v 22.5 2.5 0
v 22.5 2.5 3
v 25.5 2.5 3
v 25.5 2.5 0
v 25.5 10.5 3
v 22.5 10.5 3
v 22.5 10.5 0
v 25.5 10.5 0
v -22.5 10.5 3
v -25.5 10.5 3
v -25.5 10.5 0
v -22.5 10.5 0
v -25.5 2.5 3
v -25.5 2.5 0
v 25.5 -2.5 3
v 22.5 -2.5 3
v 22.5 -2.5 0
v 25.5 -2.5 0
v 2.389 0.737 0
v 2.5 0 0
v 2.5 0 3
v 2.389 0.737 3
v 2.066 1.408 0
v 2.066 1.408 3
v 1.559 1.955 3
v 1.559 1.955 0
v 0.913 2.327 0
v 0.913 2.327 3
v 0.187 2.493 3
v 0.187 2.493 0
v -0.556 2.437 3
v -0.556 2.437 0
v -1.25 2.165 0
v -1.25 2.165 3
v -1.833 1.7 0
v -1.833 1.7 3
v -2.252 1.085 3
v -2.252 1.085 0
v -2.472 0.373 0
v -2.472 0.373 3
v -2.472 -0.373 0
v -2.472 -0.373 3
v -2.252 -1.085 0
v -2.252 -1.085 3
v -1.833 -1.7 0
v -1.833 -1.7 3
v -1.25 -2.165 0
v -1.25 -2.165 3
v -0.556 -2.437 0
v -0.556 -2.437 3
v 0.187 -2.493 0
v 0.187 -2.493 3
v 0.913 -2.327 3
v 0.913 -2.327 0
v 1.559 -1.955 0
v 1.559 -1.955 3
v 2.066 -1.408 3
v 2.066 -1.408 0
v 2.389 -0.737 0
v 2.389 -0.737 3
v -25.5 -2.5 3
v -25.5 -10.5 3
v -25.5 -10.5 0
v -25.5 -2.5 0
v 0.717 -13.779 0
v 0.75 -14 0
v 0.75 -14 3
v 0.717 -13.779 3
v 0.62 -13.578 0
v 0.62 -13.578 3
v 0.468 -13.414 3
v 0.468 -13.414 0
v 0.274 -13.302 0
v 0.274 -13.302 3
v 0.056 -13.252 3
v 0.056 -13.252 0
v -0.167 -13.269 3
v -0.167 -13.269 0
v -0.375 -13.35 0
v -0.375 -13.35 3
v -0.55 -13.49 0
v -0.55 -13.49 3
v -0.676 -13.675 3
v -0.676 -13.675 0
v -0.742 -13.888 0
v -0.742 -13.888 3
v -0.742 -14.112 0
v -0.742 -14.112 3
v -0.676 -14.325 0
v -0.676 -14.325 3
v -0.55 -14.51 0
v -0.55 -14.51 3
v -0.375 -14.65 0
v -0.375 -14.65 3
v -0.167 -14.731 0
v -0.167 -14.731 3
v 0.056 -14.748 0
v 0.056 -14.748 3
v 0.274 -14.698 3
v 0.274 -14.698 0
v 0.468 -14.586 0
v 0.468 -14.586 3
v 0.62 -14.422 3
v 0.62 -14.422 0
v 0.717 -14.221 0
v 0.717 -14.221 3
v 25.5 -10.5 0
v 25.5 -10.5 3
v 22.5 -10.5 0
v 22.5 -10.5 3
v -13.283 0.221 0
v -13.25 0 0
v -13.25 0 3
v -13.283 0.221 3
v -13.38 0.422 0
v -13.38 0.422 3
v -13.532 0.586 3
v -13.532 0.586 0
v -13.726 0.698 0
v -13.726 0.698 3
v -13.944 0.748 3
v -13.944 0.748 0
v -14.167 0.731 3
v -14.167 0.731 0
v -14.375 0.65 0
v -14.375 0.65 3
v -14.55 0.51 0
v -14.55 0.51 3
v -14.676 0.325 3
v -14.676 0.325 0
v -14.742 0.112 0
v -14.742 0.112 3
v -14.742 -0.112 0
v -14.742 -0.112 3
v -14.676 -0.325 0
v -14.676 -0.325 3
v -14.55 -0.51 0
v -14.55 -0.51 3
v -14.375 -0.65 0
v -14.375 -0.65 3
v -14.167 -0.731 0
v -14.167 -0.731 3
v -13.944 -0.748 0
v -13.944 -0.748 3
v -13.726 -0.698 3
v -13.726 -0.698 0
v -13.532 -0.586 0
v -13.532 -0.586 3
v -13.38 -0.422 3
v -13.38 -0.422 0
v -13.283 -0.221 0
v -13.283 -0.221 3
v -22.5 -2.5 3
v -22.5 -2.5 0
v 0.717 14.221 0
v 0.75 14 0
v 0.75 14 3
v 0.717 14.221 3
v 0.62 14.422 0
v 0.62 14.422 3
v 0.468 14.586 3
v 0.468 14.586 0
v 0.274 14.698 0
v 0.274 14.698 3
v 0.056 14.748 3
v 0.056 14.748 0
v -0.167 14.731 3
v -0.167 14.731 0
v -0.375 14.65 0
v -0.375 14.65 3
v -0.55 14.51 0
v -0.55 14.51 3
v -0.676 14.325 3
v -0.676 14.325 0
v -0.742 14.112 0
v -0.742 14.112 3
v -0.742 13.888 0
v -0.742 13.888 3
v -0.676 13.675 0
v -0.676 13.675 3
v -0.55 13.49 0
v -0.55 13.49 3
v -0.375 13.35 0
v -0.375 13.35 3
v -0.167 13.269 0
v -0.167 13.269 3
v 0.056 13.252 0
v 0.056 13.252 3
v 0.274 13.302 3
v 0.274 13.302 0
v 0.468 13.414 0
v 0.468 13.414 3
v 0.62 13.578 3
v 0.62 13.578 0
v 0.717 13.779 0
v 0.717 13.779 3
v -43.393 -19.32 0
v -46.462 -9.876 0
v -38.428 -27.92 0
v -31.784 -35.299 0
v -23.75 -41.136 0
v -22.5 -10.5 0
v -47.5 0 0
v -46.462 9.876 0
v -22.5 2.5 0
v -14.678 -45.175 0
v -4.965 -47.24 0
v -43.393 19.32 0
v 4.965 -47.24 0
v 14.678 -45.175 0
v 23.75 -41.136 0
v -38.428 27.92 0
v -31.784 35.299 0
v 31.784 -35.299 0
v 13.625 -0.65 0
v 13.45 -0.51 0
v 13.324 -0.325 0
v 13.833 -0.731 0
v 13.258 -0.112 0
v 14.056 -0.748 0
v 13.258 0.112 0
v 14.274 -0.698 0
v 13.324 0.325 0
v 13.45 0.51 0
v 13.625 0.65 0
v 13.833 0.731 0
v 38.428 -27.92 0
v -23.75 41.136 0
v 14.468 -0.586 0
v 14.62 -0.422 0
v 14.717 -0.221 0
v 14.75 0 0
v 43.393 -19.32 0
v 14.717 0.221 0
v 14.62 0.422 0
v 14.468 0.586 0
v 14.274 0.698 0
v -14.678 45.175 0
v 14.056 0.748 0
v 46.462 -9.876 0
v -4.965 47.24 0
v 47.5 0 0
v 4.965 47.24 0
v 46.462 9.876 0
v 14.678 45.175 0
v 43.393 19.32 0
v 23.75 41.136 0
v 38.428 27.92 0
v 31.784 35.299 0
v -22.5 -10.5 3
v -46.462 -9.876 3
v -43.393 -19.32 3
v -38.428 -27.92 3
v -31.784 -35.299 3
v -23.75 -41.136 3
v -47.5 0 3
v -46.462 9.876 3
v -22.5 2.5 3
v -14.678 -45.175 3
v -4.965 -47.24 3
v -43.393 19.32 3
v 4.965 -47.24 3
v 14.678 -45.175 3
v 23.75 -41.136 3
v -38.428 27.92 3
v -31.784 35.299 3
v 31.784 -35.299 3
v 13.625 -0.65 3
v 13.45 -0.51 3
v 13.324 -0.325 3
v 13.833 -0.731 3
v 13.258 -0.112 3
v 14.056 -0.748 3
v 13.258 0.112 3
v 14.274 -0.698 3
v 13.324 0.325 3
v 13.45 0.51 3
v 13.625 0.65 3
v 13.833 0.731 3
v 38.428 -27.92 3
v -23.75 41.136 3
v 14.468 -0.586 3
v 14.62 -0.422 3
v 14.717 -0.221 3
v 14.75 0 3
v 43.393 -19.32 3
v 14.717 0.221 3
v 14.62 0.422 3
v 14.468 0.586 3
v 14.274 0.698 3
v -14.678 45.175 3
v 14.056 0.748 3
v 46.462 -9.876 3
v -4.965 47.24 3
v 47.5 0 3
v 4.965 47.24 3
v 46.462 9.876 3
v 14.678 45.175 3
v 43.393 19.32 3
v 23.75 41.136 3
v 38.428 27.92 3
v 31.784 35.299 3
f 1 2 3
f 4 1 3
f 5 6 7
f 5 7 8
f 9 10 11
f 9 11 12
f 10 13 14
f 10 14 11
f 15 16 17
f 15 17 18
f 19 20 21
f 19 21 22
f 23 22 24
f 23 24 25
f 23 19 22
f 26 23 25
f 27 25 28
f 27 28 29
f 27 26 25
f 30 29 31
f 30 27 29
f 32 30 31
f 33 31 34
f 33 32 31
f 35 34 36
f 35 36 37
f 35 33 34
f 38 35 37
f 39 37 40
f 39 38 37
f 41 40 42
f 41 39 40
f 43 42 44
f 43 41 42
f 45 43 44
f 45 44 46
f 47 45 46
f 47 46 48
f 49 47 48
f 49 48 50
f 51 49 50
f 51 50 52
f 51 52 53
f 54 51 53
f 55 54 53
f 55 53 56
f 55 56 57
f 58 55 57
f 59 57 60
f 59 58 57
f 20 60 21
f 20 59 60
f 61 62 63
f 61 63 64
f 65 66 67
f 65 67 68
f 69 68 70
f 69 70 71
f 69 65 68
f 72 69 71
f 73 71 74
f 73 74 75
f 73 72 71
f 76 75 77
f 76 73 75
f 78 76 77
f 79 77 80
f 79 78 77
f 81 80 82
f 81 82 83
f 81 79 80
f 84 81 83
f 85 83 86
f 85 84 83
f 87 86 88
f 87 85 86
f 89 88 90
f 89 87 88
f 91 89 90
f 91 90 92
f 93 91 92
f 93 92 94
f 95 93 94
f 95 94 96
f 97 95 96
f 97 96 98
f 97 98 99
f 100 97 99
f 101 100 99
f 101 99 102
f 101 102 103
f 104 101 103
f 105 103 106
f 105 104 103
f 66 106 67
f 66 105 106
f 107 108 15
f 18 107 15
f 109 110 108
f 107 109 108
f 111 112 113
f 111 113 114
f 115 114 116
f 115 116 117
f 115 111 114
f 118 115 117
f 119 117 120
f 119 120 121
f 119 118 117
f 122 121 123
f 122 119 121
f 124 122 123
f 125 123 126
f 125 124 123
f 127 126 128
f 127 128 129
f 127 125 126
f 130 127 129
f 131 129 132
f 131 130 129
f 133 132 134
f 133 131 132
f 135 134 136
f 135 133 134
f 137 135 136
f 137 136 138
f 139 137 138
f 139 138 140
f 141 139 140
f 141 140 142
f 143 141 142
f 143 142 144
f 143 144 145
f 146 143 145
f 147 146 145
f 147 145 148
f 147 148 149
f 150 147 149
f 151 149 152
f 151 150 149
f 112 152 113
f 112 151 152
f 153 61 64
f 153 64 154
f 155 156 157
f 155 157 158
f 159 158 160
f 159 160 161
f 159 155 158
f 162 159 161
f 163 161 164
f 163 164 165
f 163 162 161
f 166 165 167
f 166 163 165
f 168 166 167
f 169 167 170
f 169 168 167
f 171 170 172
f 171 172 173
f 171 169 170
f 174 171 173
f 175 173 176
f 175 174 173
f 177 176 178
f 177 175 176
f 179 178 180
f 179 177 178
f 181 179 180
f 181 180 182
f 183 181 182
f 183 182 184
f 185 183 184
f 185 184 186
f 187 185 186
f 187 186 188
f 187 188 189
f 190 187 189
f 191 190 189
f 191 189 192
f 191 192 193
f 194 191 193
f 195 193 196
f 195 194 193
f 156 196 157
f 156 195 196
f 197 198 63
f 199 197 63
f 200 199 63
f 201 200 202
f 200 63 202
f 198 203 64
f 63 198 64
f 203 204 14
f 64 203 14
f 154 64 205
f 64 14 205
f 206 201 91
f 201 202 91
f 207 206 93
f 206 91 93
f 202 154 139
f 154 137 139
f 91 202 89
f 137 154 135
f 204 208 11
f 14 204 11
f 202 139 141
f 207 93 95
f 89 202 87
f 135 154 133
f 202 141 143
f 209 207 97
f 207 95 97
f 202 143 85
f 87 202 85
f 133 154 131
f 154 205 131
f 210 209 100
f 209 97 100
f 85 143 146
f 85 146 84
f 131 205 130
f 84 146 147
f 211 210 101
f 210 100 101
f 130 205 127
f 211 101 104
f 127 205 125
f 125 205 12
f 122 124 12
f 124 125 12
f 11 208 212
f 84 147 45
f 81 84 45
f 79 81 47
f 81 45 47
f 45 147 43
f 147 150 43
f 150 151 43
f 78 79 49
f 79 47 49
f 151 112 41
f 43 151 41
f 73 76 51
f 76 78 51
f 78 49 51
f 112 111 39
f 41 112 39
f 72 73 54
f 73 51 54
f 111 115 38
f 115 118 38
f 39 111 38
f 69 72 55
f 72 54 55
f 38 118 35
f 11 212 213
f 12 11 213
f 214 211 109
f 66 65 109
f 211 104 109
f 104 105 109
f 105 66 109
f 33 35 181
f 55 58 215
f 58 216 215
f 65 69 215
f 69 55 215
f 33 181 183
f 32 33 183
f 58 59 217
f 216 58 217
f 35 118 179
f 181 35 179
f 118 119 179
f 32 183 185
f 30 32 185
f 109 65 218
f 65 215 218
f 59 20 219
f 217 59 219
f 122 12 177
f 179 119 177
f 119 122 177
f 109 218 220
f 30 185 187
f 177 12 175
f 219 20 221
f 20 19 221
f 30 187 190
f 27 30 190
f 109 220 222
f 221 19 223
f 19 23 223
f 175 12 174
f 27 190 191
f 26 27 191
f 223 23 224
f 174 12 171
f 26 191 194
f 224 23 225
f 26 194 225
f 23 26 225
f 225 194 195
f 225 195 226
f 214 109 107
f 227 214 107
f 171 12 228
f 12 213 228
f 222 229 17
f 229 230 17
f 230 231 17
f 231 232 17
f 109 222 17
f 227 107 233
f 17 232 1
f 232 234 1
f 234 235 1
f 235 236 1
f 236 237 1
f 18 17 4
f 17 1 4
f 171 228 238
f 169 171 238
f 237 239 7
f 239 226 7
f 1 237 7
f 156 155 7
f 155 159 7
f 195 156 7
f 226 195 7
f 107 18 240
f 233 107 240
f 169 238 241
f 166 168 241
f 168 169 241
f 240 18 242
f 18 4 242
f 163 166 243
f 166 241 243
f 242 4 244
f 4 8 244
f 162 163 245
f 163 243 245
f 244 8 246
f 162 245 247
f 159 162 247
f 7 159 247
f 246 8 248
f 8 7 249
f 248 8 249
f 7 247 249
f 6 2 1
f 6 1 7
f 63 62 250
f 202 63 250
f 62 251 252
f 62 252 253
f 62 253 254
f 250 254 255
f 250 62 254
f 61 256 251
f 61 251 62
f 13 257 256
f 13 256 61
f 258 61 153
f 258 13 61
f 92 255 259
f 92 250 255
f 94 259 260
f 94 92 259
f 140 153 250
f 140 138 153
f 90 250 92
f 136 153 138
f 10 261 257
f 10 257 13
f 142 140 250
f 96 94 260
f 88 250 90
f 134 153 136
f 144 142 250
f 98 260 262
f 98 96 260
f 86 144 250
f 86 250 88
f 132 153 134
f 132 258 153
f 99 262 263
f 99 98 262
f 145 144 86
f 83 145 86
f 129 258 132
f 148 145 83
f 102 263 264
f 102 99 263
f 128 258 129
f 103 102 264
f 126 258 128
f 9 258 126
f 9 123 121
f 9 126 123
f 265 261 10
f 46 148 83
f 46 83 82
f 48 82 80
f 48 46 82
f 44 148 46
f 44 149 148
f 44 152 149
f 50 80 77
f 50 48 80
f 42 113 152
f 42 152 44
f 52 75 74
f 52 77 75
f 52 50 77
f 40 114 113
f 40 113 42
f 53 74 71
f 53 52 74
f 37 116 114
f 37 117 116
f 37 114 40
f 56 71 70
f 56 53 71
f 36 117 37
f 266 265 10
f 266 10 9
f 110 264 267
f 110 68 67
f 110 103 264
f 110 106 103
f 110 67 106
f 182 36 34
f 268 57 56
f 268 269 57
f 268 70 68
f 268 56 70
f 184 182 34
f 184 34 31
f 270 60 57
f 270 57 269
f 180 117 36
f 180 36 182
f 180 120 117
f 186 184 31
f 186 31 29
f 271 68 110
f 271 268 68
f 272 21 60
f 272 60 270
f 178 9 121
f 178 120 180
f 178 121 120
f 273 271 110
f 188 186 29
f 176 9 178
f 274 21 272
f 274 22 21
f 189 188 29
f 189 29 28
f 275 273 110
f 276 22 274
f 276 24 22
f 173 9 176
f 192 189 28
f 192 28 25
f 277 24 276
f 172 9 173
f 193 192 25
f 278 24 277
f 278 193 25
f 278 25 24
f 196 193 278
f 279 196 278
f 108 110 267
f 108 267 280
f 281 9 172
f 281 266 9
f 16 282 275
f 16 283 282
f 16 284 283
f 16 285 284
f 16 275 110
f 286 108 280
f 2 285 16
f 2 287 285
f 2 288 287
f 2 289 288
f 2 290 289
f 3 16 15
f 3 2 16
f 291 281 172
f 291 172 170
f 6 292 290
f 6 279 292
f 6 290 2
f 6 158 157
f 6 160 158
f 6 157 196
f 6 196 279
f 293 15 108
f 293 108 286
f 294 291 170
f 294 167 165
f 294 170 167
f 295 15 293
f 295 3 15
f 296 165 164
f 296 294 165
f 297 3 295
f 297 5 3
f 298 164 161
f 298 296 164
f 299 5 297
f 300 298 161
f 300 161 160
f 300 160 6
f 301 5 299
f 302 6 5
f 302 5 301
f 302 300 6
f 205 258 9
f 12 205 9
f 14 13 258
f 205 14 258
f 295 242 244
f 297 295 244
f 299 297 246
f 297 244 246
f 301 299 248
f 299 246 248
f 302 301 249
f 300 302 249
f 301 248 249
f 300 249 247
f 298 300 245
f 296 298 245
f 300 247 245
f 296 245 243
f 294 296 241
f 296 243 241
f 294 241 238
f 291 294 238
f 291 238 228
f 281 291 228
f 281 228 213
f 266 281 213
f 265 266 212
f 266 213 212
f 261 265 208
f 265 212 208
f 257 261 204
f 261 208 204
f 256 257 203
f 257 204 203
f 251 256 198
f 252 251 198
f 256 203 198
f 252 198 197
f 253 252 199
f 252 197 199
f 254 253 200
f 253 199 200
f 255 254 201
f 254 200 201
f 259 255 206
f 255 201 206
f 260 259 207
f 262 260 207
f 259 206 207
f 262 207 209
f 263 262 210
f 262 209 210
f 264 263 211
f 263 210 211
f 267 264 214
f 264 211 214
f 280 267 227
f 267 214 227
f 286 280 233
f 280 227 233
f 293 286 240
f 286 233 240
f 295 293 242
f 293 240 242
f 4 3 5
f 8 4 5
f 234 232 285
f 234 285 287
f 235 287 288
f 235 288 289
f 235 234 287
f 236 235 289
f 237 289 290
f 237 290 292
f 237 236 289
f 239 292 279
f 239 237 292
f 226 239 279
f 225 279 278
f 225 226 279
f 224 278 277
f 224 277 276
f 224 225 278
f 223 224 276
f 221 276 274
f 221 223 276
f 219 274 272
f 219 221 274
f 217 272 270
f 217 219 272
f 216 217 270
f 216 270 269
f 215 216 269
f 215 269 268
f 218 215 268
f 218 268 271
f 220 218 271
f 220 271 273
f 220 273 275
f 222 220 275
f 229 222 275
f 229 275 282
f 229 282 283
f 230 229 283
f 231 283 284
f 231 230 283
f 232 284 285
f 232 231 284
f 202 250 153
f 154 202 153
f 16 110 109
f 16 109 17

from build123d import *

# Parameters (mm, degrees)
CROQUIS1_R              = 47.5
CROQUIS1_R_2            = 2.5
CROQUIS1_R_3            = 0.75
SALIENTE_EXTRUIR1_DEPTH = 3
CROQUIS2_W              = 3
CROQUIS2_H              = 8
CORTAR_EXTRUIR1_DEPTH   = 4


with BuildPart() as part:
    # Croquis1 → Saliente-Extruir1 (new body)
    with BuildSketch(Plane.XY):
        Circle(CROQUIS1_R)
        Circle(CROQUIS1_R_2, mode=Mode.SUBTRACT)
        with Locations((0, -14)):
            Circle(CROQUIS1_R_3, mode=Mode.SUBTRACT)
        with Locations((-14, 0)):
            Circle(CROQUIS1_R_3, mode=Mode.SUBTRACT)
        with Locations((0, 14)):
            Circle(CROQUIS1_R_3, mode=Mode.SUBTRACT)
        with Locations((14, 0)):
            Circle(CROQUIS1_R_3, mode=Mode.SUBTRACT)
    extrude(amount=SALIENTE_EXTRUIR1_DEPTH)

    # Croquis2 → Cortar-Extruir1 (cut, through all)
    with BuildSketch(Plane.XY.offset(3)):
        with Locations((24, 6.5)):
            Rectangle(CROQUIS2_W, CROQUIS2_H)
        with Locations((24, -6.5)):
            Rectangle(CROQUIS2_W, CROQUIS2_H)
        with Locations((-24, -6.5)):
            Rectangle(CROQUIS2_W, CROQUIS2_H)
        with Locations((-24, 6.5)):
            Rectangle(CROQUIS2_W, CROQUIS2_H)
    extrude(amount=-CORTAR_EXTRUIR1_DEPTH, mode=Mode.SUBTRACT)


solid = part.part
